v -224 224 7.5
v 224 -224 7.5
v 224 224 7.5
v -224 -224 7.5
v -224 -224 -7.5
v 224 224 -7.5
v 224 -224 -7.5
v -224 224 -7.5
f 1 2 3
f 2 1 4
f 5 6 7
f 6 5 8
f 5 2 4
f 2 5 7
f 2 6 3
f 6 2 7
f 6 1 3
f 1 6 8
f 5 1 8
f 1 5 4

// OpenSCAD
// file: Consts.scad
// all the consts for a project 
Designing=true;
number_of_bottles=5;
Bottle_r=74;
Buffer=5;
outsideR=150;
insideR=outsideR-Bottle_r-Buffer;
BaseHight=15;
baseRad=Bottle_r+outsideR;
//stuff
// main file
include <Consts.scad>

/*
base holds all the things in alinment 
so it holds:
    1.carousel 
        a.gears 
        b. motor
    2.filling assabimly 
        a. tub holder
        b. pump   

*/

module base() {
    cube([baseRad*2,baseRad*2,BaseHight],center= true);
    
}



base();
